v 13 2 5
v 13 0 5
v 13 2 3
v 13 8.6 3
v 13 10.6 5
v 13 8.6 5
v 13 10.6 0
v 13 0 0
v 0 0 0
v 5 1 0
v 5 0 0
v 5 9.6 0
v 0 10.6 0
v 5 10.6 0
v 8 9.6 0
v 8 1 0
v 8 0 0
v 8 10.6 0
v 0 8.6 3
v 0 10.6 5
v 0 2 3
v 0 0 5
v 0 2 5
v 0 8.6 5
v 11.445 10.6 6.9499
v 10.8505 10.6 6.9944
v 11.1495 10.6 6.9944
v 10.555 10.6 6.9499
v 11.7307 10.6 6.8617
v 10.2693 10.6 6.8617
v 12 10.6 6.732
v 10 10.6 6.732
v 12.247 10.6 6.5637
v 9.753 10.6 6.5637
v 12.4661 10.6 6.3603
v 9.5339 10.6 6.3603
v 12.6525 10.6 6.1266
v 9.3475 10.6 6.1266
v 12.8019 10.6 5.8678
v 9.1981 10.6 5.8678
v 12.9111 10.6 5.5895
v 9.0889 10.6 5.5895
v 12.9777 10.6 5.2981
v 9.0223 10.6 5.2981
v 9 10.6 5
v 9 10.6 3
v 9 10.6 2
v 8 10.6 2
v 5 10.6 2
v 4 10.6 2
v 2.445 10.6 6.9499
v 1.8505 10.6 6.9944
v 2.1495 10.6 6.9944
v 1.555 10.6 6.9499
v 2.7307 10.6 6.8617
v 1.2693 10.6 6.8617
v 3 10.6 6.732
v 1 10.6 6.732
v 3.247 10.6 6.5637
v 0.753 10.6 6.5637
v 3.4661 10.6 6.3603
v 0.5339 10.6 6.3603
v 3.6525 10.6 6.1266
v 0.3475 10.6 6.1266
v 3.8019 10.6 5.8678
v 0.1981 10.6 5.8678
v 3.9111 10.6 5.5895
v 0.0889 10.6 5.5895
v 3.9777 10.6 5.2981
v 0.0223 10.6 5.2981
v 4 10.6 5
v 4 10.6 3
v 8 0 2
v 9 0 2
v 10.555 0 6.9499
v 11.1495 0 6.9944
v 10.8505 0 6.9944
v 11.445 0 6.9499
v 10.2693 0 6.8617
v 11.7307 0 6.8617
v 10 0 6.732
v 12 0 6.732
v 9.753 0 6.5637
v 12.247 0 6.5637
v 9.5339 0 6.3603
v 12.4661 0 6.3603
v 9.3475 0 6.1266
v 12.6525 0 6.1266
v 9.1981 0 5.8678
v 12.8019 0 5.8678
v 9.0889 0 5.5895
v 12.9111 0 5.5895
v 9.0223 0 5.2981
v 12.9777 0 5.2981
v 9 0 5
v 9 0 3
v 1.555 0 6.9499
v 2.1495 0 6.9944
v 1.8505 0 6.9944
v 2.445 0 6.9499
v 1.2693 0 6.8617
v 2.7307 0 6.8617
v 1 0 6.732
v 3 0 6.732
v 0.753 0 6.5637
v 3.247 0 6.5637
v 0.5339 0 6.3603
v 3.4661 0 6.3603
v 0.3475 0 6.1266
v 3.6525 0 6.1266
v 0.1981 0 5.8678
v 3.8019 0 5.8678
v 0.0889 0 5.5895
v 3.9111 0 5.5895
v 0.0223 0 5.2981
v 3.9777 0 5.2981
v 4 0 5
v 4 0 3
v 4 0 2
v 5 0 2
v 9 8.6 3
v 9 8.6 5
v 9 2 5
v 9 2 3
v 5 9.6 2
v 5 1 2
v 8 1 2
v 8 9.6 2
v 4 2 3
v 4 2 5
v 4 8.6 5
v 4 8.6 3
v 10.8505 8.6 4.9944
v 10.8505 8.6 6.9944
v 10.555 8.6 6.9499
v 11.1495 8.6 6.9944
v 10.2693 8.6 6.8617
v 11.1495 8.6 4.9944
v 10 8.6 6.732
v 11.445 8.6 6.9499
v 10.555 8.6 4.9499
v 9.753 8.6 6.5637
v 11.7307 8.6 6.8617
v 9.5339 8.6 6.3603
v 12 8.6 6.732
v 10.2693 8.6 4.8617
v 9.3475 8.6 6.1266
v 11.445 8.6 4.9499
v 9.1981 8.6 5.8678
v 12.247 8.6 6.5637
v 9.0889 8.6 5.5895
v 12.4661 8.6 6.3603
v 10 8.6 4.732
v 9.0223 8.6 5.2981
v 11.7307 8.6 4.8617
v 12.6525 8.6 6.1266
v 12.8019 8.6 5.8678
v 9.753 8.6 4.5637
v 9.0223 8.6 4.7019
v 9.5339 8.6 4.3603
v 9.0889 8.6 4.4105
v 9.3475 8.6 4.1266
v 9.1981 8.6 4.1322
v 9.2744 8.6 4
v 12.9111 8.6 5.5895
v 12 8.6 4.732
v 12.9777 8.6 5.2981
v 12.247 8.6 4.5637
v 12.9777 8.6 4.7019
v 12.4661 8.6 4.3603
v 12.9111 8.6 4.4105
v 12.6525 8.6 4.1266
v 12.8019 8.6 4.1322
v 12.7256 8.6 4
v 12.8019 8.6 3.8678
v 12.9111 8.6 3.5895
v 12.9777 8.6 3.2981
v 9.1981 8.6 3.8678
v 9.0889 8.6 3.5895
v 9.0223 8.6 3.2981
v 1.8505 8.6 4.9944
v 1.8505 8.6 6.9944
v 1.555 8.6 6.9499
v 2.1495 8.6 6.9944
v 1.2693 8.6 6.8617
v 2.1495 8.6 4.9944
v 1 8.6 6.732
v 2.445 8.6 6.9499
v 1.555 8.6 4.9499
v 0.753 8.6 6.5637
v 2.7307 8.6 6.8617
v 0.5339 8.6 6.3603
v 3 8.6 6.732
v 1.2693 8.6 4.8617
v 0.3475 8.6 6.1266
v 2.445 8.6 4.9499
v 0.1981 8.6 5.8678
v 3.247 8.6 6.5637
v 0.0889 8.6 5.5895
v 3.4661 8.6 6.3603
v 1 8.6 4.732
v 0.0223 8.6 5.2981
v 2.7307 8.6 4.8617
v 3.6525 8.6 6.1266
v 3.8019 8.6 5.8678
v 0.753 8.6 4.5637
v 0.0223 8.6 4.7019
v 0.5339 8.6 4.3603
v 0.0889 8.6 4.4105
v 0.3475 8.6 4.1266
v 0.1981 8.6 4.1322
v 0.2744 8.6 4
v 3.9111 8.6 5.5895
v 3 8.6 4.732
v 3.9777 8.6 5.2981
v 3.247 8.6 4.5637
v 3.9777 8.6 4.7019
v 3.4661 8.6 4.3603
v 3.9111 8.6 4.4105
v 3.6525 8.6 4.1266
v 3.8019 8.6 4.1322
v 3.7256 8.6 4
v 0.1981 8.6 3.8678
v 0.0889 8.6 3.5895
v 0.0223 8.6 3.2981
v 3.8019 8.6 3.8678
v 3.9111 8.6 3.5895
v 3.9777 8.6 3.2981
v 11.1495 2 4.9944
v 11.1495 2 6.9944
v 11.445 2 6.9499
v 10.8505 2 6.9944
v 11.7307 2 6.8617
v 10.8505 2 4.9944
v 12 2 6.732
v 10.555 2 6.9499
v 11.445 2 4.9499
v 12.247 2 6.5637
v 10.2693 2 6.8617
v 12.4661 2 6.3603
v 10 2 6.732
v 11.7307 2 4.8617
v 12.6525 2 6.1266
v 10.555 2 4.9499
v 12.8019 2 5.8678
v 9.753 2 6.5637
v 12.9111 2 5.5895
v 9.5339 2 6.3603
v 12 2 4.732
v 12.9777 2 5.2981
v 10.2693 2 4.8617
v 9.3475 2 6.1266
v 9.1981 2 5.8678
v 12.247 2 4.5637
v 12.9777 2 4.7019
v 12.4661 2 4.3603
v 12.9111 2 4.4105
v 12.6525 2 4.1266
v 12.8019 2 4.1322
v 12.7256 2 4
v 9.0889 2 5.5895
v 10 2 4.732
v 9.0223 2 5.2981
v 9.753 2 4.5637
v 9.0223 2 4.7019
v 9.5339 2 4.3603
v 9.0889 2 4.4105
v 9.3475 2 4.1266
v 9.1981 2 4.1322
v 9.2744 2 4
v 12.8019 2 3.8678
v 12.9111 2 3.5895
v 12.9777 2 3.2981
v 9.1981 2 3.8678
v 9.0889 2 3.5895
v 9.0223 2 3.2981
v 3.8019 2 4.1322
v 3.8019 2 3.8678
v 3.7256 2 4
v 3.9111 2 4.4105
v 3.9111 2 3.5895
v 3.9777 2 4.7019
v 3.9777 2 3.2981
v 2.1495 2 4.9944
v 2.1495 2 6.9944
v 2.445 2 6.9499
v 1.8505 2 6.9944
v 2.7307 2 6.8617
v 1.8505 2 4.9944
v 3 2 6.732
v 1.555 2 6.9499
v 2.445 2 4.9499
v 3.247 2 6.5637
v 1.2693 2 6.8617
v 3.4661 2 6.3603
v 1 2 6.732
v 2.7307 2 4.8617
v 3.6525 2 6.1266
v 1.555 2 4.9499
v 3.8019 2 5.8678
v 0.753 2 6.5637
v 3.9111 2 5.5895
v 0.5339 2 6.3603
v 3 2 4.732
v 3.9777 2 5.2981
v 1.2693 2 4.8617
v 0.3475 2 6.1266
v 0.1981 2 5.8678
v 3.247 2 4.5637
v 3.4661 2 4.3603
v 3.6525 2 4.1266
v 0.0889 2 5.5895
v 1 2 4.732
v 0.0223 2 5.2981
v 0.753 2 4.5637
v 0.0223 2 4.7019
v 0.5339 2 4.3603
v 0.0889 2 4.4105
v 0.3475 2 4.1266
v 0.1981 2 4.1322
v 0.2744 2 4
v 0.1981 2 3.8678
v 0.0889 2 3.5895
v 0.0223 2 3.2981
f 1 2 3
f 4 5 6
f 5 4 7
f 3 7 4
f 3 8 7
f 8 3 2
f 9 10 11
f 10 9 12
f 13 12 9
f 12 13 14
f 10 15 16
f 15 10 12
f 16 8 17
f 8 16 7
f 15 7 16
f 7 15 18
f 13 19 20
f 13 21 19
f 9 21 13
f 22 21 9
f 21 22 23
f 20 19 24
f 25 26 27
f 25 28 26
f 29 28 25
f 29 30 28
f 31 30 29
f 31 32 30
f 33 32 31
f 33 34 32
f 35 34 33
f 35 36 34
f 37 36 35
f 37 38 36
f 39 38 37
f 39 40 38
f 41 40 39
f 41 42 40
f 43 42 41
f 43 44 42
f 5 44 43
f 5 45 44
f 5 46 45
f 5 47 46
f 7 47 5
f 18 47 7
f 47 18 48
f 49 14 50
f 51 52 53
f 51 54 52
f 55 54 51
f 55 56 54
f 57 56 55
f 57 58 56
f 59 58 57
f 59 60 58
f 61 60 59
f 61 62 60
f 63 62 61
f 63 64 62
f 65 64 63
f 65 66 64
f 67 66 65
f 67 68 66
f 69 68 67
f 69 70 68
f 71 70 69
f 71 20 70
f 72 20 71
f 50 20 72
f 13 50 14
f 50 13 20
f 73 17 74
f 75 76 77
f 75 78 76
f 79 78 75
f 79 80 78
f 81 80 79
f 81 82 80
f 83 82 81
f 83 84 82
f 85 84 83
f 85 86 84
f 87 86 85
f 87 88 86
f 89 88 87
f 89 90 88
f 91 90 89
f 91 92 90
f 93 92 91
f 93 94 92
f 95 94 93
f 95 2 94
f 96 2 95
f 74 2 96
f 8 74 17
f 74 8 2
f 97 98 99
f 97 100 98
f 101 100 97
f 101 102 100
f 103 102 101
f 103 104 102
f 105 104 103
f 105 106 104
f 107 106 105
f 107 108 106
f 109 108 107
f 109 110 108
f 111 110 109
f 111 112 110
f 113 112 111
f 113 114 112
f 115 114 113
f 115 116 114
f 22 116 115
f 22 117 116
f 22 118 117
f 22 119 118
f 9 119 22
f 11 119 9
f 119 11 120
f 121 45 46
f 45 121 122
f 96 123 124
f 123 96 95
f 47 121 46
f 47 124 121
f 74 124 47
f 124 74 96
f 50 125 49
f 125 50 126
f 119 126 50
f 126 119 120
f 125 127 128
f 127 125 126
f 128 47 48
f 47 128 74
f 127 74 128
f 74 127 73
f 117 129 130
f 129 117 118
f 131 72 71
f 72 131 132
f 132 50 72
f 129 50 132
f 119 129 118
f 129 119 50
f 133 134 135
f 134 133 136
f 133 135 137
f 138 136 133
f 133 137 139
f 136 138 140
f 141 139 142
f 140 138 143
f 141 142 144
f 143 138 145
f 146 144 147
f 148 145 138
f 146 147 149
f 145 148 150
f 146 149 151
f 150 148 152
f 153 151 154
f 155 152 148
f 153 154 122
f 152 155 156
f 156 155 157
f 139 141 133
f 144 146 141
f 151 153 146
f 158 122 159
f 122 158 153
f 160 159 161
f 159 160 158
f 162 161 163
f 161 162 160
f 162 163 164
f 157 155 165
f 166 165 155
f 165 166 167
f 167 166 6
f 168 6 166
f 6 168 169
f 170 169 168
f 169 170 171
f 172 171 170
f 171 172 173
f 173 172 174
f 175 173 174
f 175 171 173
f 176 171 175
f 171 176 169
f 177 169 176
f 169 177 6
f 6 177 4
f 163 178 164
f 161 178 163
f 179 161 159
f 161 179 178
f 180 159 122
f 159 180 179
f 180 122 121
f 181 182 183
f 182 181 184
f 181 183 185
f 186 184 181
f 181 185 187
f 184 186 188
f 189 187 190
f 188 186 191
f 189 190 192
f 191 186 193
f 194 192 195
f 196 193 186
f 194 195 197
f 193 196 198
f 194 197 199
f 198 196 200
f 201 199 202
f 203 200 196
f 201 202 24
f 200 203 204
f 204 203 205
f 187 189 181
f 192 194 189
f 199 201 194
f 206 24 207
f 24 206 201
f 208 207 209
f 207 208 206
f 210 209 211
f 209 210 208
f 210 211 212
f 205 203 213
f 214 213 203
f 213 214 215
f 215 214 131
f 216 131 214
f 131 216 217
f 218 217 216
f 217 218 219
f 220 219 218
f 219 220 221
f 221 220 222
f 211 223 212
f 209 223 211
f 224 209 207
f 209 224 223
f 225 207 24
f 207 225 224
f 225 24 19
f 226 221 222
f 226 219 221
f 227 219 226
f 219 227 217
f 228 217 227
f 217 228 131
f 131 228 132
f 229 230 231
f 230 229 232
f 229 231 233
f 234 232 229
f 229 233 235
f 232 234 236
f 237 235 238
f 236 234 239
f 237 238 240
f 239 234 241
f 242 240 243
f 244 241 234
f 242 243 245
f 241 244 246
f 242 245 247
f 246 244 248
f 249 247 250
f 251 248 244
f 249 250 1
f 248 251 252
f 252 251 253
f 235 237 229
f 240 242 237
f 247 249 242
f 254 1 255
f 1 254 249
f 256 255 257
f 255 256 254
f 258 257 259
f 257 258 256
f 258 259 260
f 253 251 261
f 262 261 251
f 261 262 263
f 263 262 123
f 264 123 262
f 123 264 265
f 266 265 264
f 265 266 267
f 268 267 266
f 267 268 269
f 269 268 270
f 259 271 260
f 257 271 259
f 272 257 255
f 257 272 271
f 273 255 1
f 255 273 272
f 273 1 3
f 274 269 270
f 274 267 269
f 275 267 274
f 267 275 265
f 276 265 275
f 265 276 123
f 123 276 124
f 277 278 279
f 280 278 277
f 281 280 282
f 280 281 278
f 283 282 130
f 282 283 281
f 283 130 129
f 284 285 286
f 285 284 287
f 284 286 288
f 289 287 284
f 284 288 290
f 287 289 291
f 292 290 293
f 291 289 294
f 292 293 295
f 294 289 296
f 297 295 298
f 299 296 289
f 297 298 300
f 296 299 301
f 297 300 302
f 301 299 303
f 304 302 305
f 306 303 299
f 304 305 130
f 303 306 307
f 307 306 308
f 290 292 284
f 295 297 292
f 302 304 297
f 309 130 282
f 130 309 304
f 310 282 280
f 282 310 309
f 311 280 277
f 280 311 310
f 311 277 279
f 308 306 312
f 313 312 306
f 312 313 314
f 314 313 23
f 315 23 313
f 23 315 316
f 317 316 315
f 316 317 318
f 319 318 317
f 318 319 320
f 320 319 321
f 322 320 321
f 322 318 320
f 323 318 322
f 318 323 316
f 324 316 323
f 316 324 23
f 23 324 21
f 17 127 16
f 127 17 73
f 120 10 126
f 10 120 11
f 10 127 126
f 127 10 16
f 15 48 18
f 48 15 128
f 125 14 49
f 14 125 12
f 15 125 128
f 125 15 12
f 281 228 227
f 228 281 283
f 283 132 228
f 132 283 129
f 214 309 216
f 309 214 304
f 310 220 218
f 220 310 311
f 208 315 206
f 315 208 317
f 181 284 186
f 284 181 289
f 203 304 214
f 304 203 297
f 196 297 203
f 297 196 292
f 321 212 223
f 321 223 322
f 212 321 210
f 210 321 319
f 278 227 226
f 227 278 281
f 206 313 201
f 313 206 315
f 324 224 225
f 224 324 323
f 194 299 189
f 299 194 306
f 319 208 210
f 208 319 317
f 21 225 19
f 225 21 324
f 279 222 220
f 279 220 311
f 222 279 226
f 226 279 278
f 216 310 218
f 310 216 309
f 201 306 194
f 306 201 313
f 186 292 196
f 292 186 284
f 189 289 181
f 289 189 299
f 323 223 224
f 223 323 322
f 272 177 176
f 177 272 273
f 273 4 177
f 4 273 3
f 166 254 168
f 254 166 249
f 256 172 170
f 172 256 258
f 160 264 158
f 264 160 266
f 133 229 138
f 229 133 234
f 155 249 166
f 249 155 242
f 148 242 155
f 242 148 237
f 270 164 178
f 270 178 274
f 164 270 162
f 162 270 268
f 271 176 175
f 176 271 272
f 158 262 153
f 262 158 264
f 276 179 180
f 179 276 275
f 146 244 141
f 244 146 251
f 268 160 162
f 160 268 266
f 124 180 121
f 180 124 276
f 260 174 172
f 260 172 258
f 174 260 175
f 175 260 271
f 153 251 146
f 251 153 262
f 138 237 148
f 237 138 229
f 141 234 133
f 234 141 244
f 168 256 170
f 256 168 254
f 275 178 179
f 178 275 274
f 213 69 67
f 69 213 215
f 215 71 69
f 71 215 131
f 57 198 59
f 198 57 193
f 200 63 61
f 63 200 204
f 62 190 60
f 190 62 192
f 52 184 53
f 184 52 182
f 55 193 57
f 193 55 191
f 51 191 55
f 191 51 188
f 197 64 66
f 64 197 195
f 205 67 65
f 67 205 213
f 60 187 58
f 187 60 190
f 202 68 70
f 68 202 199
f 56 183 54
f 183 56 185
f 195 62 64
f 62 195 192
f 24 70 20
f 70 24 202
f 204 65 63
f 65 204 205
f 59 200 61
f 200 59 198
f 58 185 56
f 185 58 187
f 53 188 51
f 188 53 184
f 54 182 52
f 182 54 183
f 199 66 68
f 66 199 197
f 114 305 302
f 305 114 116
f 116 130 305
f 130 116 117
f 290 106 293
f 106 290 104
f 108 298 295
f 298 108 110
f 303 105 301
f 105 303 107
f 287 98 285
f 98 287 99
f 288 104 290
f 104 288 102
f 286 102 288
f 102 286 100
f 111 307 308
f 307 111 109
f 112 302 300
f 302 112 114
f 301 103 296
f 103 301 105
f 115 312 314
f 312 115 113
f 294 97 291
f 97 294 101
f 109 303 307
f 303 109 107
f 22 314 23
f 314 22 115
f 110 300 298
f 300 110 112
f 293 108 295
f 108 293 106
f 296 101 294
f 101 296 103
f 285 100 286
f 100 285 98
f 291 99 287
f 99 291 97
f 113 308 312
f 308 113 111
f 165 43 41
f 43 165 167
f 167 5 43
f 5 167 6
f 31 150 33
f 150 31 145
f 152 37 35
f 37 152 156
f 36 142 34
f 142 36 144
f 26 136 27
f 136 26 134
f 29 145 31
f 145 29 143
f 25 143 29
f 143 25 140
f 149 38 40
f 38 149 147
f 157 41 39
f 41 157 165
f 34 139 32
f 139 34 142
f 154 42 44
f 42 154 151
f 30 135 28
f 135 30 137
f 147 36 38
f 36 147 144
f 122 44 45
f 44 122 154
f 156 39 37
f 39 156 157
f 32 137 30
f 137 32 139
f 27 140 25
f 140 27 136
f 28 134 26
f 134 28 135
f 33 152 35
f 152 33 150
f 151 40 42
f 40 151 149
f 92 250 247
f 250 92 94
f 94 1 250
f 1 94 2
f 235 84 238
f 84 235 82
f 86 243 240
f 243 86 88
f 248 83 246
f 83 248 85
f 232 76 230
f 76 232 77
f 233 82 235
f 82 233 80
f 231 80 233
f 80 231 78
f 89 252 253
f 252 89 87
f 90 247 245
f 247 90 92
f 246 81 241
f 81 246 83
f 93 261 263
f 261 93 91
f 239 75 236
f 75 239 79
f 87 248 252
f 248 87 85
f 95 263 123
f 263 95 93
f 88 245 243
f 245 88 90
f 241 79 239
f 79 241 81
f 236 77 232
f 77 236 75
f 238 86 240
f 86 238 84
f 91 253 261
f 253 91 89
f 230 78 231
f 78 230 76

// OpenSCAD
//******************* OTHER FILES NEEDED ************************************** 


//*****************************************************************************
//******************* VARIABLES TO ADJUST *************************************

bottomBlockHeight = 2;
baseToBelt = 5;
width = 10;
centreGap = 5;
beltWidth = 6.6;
cableTieWidth = 3;
cableTieRecess = 1;
beltPathRadius = 2;
outsideWidth = 2;
beltRecessHeight = 2;

//*****************************************************************************
//******************* OTHER VARIABLES *****************************************

//$fn = 36;
$fa=3;
$fs=.3;

//*****************************************************************************
//******************* VIEW ****************************************************

beltTightener();

//doublebeltTightener();

//*****************************************************************************
//******************* MODULES *************************************************

module beltTightener(){
length = beltPathRadius * 4 + centreGap;
width = outsideWidth * 2 + beltWidth;
blockHeight = baseToBelt + beltRecessHeight - beltPathRadius;
	union(){
		difference(){
			cube([length,width,blockHeight]);
				translate([beltPathRadius * 2,-1,bottomBlockHeight])
					cube([length - beltPathRadius * 4,width + 2,baseToBelt + beltRecessHeight]);
				translate([-1,outsideWidth,baseToBelt - beltPathRadius])
					cube([length + 2,beltWidth,beltRecessHeight + 1]);
				translate([length / 2 - cableTieWidth / 2, -1, -1])
					cube([cableTieWidth,cableTieRecess + 1,bottomBlockHeight + 2]);
				translate([length / 2 - cableTieWidth / 2, width - cableTieRecess, -1])
					cube([cableTieWidth,cableTieRecess + 1,bottomBlockHeight + 2]);
		}
		translate([beltPathRadius, width, baseToBelt - beltPathRadius]) rotate([90, 0, 0]) cylinder(r = beltPathRadius, h = width);
		translate([length - beltPathRadius, width, baseToBelt - beltPathRadius]) rotate([90, 0, 0]) cylinder(r = beltPathRadius, h = width);
		translate([beltPathRadius, width, baseToBelt + beltRecessHeight - beltPathRadius]) rotate([90, 0, 0]) cylinder(r = beltPathRadius, h = outsideWidth);
		translate([beltPathRadius, outsideWidth, baseToBelt + beltRecessHeight - beltPathRadius]) rotate([90, 0, 0]) cylinder(r = beltPathRadius, h = outsideWidth);
		translate([length - beltPathRadius, width, baseToBelt + beltRecessHeight - beltPathRadius]) rotate([90, 0, 0]) cylinder(r = beltPathRadius, h = outsideWidth);
		translate([length - beltPathRadius, outsideWidth, baseToBelt + beltRecessHeight - beltPathRadius]) rotate([90, 0, 0]) cylinder(r = beltPathRadius, h = outsideWidth);

	}
}


module doublebeltTightener(){
	union(){
		beltTightener();
		translate([beltPathRadius * 2 + centreGap, 0, 0]) beltTightener();
	}
}


//********************** END MODULES ******************************************
